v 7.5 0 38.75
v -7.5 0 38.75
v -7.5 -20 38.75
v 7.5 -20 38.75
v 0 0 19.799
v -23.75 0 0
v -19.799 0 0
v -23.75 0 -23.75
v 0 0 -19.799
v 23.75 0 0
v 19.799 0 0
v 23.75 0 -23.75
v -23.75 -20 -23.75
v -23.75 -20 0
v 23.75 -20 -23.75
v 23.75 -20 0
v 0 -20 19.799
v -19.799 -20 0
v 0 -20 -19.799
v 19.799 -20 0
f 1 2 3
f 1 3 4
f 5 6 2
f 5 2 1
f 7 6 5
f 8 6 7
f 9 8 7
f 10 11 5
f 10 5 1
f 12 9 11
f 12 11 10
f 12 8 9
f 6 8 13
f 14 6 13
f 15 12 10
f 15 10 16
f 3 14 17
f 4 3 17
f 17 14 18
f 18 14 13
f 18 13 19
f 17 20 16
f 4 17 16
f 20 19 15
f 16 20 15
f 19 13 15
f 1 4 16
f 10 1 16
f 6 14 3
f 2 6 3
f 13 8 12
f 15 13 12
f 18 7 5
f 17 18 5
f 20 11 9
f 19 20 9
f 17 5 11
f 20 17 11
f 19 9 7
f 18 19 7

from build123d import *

# Parameters (mm, degrees)
F0_W     = 47.5
F0_H     = 47.5
F1_DEPTH = 20
F2_DEPTH = 15
F4_DEPTH = 20.001


with BuildPart() as f1:
    # F0 (on Front) → F1 (new body)
    with BuildSketch(Plane.XZ):
        Rectangle(F0_W, F0_H)
        Polygon((0, 19.7989898732), (19.7989898732, 19.7989898732), (19.7989898732, 0), (19.7989898732, -19.7989898732), (0, -19.7989898732), (-19.7989898732, -19.7989898732), (-19.7989898732, 0), (-19.7989898732, 19.7989898732), align=None, mode=Mode.SUBTRACT)
        Polygon((-19.7989898732, 0), (0, 19.7989898732), (-19.7989898732, 19.7989898732), align=None)
        Polygon((0, -19.7989898732), (-19.7989898732, 0), (-19.7989898732, -19.7989898732), align=None)
        Polygon((19.7989898732, -19.7989898732), (19.7989898732, 0), (0, -19.7989898732), align=None)
        Polygon((19.7989898732, 0), (19.7989898732, 19.7989898732), (0, 19.7989898732), align=None)
    extrude(amount=F1_DEPTH)

    # F2 (add): a face of the model
    f2_faces = [f1.faces().sort_by_distance(p)[0] for p in [
        (0, -10, 23.75),
    ]]
    extrude(f2_faces, amount=F2_DEPTH)

    # F3 (on face) → F4 (cut, through all)
    with BuildSketch(Plane.XZ.offset(20)):
        Polygon((-23.75, 38.75), (-23.75, 0), (-7.5, 38.75), align=None)
        Polygon((23.75, 38.75), (7.5, 38.75), (23.75, 0), align=None)
    extrude(amount=-F4_DEPTH, mode=Mode.SUBTRACT)


solid = f1.part
